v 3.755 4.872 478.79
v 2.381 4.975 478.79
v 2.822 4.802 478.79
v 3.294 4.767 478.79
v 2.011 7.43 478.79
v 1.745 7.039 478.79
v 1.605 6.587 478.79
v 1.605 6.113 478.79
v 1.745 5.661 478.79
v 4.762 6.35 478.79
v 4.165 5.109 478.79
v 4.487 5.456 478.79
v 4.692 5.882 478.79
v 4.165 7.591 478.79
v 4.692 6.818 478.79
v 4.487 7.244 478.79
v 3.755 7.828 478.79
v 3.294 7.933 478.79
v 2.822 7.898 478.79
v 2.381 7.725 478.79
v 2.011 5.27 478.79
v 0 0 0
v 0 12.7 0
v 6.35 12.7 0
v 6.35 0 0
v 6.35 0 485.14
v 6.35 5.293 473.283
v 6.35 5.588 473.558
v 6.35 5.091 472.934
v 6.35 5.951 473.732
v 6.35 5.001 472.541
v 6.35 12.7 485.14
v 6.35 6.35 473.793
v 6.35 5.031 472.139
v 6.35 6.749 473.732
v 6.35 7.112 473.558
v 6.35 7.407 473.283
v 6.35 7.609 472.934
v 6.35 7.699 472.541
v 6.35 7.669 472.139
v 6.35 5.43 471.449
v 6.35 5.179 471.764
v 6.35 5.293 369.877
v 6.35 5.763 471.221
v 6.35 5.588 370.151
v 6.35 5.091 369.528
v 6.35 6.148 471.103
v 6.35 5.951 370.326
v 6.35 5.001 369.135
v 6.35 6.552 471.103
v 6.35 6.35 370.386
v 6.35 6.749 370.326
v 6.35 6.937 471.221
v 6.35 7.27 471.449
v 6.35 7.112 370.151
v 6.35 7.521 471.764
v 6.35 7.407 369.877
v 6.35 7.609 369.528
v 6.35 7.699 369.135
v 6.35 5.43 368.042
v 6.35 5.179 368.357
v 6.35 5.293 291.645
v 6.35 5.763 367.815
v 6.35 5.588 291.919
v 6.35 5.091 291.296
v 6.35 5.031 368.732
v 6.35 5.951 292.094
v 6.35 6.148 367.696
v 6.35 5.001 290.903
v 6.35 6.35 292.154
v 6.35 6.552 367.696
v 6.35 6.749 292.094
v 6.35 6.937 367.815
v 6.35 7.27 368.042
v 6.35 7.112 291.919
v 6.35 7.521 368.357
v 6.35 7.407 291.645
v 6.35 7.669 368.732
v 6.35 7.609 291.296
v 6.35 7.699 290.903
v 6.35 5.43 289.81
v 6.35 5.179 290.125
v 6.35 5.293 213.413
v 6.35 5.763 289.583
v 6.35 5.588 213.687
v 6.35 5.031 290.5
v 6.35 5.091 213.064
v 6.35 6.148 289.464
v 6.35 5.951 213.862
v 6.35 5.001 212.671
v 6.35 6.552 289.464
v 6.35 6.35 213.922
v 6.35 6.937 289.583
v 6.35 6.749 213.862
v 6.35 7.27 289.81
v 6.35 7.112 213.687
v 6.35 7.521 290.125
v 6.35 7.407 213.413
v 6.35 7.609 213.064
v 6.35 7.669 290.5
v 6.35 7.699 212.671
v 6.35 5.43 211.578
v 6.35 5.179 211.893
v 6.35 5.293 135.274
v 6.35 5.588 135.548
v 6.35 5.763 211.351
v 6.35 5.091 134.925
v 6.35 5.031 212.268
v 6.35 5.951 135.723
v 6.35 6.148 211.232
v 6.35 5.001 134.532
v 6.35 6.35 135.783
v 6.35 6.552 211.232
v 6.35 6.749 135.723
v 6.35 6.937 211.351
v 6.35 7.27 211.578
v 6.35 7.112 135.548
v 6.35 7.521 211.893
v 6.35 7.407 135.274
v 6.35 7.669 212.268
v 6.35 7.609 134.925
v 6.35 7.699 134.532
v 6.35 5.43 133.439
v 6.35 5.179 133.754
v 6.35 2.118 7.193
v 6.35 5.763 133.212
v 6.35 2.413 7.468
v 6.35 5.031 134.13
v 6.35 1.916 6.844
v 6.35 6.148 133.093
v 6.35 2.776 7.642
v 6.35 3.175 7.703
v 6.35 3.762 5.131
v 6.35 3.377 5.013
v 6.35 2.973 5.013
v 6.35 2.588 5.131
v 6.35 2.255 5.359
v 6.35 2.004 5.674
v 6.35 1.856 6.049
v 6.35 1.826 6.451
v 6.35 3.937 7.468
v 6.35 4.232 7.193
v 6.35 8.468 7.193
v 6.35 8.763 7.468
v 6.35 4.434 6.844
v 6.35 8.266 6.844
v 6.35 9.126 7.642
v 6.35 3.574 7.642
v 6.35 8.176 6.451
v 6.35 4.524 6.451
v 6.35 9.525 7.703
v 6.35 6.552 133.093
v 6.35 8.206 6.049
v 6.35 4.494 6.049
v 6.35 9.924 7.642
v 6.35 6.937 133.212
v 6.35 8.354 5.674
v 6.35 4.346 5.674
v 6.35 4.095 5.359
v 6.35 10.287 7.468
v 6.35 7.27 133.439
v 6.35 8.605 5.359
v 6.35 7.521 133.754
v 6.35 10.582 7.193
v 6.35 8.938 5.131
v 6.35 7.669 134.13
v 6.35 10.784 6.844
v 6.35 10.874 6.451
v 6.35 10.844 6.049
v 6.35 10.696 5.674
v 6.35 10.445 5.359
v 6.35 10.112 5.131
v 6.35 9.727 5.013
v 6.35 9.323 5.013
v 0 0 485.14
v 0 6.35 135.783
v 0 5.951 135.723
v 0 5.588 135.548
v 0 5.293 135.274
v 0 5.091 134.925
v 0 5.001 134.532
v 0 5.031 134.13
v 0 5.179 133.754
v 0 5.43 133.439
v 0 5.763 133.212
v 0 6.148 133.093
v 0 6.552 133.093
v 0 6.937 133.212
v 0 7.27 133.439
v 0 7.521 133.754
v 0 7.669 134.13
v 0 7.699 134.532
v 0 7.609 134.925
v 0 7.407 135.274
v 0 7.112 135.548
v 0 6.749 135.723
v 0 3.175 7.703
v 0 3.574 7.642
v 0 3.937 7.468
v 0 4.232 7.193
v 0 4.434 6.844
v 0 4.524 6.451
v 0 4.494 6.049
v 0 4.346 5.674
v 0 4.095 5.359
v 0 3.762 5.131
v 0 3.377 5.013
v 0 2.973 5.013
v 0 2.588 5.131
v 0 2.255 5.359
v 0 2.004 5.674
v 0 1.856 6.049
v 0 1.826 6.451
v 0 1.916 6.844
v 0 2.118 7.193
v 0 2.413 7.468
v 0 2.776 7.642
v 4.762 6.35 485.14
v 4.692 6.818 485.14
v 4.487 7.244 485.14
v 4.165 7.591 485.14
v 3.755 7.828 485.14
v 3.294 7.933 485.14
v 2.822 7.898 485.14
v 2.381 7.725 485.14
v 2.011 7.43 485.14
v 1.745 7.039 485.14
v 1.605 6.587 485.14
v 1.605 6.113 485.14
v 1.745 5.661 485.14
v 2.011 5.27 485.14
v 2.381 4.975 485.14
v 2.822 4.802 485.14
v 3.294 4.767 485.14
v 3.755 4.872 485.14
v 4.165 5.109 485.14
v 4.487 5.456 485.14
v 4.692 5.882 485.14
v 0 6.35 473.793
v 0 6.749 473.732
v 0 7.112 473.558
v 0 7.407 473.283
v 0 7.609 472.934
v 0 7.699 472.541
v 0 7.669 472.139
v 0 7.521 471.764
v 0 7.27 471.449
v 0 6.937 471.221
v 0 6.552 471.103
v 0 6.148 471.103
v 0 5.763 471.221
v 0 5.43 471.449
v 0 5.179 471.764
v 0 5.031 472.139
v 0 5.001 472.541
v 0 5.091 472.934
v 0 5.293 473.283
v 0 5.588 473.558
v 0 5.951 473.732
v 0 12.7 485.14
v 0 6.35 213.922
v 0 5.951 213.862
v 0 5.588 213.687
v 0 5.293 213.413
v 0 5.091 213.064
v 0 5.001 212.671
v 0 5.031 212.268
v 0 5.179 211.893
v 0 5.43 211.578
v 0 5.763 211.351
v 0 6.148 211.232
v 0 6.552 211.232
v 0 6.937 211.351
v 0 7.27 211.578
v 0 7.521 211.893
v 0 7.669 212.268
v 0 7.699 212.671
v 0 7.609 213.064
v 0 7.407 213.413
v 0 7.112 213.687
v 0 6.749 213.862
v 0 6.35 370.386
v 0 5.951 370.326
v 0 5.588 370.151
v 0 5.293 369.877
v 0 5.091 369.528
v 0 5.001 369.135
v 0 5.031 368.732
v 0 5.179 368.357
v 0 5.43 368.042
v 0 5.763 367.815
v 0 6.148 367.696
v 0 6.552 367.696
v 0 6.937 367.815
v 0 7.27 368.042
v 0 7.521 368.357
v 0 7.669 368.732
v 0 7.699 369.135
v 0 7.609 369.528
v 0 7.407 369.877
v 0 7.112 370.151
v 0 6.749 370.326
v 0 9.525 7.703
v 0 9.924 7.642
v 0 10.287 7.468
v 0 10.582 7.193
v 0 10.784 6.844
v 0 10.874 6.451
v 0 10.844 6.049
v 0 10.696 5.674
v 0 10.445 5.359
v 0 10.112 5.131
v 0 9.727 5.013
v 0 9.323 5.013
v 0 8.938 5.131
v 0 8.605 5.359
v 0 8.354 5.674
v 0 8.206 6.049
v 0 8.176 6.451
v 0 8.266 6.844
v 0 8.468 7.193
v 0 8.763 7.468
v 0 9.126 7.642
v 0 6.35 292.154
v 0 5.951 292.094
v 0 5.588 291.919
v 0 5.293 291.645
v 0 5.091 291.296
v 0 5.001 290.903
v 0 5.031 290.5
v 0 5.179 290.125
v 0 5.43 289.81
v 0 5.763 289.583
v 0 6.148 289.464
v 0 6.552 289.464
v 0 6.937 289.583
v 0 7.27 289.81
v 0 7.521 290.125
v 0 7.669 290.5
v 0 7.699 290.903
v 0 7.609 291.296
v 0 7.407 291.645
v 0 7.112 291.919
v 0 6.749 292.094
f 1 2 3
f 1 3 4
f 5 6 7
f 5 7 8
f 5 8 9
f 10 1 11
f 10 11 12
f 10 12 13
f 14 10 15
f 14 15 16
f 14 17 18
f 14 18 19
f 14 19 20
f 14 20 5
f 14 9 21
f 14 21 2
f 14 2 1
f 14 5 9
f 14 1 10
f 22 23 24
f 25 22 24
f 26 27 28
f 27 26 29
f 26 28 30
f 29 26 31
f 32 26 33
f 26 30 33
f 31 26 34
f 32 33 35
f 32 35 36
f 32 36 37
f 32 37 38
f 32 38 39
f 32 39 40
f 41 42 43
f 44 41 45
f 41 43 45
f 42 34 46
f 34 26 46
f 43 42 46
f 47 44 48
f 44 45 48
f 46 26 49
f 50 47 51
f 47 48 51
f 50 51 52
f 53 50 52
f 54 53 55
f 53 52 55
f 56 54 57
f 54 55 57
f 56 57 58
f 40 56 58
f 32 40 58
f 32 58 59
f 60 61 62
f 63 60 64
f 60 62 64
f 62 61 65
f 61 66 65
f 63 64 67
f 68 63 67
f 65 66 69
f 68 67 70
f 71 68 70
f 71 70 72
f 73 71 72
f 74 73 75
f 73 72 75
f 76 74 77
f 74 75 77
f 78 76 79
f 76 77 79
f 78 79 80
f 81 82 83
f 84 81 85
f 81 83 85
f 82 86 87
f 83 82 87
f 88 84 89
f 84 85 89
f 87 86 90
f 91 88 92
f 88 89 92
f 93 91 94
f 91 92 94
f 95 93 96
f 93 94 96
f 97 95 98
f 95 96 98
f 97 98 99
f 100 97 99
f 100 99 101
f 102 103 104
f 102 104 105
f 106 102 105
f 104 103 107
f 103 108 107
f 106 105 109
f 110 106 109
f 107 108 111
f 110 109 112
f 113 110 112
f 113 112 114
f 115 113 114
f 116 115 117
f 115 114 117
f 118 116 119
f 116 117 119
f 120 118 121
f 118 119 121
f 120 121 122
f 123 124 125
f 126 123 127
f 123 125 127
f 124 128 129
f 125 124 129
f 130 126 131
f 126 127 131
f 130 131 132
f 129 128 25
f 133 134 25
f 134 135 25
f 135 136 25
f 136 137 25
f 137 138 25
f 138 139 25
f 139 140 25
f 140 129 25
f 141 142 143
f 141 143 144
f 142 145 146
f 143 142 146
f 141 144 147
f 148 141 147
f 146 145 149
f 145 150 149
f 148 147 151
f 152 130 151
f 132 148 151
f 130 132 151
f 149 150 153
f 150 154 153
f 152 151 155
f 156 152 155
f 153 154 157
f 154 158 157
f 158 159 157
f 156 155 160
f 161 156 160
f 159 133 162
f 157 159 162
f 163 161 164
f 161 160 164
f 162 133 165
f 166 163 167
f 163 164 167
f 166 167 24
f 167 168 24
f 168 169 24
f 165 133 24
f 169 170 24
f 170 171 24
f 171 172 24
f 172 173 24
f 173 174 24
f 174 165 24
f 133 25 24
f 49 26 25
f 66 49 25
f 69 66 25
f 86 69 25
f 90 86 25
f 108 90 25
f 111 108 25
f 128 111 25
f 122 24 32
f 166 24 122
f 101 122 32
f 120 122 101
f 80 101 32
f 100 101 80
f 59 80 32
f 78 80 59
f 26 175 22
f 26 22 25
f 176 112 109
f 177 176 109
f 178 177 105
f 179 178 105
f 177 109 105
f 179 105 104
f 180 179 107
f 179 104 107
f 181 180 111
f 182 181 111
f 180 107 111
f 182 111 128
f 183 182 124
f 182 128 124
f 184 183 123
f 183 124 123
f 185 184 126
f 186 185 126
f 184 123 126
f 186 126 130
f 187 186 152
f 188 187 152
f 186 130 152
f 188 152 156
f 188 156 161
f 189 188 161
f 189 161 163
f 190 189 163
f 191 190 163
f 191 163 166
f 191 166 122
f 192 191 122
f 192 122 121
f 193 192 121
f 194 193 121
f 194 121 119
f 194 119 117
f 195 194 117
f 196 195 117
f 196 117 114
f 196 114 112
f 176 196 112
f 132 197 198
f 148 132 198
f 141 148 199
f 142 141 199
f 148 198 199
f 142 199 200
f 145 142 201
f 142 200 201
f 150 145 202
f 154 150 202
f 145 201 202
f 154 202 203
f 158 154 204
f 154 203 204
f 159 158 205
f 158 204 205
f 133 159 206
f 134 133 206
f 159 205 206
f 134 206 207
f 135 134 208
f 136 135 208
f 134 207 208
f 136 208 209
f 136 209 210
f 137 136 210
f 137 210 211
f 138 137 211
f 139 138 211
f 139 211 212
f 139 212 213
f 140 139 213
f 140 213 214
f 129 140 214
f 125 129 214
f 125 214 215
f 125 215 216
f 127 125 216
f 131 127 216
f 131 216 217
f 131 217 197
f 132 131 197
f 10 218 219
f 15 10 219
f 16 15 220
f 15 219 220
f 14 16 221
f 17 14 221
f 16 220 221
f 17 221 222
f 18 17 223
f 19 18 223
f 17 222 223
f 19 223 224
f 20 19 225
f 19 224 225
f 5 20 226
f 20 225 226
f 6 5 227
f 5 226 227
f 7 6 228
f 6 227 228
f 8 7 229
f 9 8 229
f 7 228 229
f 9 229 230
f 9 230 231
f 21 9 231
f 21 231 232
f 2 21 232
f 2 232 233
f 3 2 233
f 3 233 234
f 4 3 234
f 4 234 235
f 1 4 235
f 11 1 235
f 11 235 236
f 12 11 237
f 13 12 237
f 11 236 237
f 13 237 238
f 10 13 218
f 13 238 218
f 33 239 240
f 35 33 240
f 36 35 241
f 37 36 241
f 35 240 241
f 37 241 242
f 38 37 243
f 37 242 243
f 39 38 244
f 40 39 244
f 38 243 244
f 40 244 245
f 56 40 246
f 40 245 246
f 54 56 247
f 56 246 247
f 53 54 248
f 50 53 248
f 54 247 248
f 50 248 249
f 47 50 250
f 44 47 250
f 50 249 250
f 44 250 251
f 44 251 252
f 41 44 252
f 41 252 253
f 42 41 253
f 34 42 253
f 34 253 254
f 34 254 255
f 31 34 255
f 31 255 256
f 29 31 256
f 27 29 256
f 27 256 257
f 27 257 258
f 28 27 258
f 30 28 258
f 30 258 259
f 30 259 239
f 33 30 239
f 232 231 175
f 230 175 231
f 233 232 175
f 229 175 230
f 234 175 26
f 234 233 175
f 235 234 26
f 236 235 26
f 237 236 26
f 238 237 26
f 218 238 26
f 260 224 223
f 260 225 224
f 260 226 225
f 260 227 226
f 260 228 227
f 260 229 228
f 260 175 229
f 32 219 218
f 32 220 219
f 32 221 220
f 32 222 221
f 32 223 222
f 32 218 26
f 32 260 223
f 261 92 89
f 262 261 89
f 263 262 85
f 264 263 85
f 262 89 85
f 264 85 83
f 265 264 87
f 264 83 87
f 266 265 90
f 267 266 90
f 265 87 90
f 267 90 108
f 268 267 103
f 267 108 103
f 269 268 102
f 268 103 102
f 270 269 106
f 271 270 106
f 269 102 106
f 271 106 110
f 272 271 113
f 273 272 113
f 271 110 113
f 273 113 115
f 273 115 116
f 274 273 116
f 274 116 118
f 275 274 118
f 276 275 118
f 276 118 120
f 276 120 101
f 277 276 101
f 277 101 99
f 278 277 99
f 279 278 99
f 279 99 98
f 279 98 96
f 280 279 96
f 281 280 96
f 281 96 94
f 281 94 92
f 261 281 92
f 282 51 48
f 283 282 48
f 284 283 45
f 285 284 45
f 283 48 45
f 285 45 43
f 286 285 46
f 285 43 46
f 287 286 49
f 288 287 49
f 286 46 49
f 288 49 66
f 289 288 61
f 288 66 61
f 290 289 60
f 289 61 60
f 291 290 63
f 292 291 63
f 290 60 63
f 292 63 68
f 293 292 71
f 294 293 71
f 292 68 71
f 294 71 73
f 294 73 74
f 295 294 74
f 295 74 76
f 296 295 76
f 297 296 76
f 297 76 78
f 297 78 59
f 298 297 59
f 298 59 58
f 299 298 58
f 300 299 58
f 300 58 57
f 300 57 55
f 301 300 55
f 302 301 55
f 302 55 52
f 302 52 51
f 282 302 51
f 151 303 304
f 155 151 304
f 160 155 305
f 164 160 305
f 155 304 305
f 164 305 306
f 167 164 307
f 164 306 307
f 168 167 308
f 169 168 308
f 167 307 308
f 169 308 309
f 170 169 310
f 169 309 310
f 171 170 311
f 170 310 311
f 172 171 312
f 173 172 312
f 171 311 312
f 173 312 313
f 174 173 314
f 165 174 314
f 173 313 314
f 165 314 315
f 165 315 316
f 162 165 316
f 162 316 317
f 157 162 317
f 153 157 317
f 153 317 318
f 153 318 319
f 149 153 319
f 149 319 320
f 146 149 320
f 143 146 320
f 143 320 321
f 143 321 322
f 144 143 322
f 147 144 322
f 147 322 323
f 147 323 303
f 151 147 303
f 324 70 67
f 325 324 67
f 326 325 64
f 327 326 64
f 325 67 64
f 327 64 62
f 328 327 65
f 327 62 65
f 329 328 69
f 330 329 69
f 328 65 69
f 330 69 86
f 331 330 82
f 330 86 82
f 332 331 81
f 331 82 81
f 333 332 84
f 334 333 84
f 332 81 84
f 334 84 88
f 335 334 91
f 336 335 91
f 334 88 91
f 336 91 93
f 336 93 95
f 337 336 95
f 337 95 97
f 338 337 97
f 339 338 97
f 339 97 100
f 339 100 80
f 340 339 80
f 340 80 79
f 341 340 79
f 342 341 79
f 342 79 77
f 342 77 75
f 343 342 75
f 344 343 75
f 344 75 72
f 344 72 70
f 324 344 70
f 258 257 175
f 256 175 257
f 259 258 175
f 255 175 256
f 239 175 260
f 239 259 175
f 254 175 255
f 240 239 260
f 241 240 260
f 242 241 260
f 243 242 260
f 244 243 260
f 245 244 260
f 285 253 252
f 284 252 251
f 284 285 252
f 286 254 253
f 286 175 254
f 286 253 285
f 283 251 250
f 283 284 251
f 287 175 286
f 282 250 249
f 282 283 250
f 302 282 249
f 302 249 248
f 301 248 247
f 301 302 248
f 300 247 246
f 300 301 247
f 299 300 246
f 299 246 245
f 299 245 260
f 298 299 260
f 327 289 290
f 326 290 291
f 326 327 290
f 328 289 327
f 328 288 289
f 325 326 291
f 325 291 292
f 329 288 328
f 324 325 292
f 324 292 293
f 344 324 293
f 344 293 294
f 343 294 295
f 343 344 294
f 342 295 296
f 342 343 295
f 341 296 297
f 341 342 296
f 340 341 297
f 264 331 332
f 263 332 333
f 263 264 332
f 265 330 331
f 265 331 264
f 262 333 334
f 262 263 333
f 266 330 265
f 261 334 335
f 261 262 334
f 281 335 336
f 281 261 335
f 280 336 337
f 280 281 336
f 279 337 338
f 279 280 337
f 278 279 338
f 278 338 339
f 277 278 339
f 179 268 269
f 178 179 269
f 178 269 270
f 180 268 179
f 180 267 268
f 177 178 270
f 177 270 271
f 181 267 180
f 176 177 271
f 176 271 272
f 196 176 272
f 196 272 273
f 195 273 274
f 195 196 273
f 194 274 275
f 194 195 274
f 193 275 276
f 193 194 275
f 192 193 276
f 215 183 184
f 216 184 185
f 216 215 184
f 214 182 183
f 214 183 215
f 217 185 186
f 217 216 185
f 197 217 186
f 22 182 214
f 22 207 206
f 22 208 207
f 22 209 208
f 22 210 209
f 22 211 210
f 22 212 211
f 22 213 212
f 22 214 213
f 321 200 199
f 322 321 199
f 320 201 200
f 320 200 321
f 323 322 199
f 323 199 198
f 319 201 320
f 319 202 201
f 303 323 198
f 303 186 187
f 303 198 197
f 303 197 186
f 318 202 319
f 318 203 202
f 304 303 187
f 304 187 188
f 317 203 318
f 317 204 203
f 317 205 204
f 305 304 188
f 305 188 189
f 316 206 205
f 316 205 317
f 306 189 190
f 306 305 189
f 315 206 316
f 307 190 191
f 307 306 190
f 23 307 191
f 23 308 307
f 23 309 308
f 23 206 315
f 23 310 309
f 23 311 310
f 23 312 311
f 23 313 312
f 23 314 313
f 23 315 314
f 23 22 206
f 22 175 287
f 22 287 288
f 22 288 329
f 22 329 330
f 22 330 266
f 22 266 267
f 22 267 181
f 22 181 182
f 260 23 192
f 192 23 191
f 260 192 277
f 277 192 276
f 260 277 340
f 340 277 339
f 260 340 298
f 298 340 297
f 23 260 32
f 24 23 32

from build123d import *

# Parameters (mm, degrees)
SKETCH1_W                 = 6.35
SKETCH1_H                 = 12.7
BOSS_EXTRUDE1_DEPTH       = 485.14
TAP_DRILL_FOR_6_32_TAP2_D = 2.7051
TAP_DRILL_FOR_6_32_TAP1_D = 2.7051
SKETCH6_R                 = 1.5875
CUT_EXTRUDE1_DEPTH        = 6.35
TAP_DRILL_FOR_6_32_TAP4_D = 2.7051


with BuildPart() as part:
    # Sketch1 → Boss-Extrude1 (new body)
    with BuildSketch(Plane.XY):
        with Locations((3.175, 6.35)):
            Rectangle(SKETCH1_W, SKETCH1_H)
    extrude(amount=BOSS_EXTRUDE1_DEPTH)

    # Tap Drill for #6-32 Tap2 (through all)
    with Locations(Plane(origin=(6.35, 0, 0), x_dir=(0, 0, -1), z_dir=(1, 0, 0))):
        with Locations((-6.35, 3.175), (-6.35, 9.525)):
            Hole(TAP_DRILL_FOR_6_32_TAP2_D / 2)

    # Tap Drill for #6-32 Tap1 (through all)
    with Locations(Plane(origin=(6.35, 0, 0), x_dir=(0, 0, -1), z_dir=(1, 0, 0))):
        with Locations((-472.44, 6.35)):
            Hole(TAP_DRILL_FOR_6_32_TAP1_D / 2)

    # Sketch6 → Cut-Extrude1 (cut)
    with BuildSketch(Plane.XY.offset(485.14)):
        with Locations((3.175, 6.35)):
            Circle(SKETCH6_R)
    extrude(amount=-CUT_EXTRUDE1_DEPTH, mode=Mode.SUBTRACT)

    # Tap Drill for #6-32 Tap4 (through all)
    with Locations(Plane(origin=(-13.49375, 1342.118435602, -1739.809386822), x_dir=(0, 0, -1), z_dir=(-1, 0, 0))):
        with Locations((-2108.842826276, 1335.768435602), (-1952.378826276, 1335.768435602), (-2030.610826276, 1335.768435602), (-1874.240025135, 1335.768435602)):
            Hole(TAP_DRILL_FOR_6_32_TAP4_D / 2)


solid = part.part
